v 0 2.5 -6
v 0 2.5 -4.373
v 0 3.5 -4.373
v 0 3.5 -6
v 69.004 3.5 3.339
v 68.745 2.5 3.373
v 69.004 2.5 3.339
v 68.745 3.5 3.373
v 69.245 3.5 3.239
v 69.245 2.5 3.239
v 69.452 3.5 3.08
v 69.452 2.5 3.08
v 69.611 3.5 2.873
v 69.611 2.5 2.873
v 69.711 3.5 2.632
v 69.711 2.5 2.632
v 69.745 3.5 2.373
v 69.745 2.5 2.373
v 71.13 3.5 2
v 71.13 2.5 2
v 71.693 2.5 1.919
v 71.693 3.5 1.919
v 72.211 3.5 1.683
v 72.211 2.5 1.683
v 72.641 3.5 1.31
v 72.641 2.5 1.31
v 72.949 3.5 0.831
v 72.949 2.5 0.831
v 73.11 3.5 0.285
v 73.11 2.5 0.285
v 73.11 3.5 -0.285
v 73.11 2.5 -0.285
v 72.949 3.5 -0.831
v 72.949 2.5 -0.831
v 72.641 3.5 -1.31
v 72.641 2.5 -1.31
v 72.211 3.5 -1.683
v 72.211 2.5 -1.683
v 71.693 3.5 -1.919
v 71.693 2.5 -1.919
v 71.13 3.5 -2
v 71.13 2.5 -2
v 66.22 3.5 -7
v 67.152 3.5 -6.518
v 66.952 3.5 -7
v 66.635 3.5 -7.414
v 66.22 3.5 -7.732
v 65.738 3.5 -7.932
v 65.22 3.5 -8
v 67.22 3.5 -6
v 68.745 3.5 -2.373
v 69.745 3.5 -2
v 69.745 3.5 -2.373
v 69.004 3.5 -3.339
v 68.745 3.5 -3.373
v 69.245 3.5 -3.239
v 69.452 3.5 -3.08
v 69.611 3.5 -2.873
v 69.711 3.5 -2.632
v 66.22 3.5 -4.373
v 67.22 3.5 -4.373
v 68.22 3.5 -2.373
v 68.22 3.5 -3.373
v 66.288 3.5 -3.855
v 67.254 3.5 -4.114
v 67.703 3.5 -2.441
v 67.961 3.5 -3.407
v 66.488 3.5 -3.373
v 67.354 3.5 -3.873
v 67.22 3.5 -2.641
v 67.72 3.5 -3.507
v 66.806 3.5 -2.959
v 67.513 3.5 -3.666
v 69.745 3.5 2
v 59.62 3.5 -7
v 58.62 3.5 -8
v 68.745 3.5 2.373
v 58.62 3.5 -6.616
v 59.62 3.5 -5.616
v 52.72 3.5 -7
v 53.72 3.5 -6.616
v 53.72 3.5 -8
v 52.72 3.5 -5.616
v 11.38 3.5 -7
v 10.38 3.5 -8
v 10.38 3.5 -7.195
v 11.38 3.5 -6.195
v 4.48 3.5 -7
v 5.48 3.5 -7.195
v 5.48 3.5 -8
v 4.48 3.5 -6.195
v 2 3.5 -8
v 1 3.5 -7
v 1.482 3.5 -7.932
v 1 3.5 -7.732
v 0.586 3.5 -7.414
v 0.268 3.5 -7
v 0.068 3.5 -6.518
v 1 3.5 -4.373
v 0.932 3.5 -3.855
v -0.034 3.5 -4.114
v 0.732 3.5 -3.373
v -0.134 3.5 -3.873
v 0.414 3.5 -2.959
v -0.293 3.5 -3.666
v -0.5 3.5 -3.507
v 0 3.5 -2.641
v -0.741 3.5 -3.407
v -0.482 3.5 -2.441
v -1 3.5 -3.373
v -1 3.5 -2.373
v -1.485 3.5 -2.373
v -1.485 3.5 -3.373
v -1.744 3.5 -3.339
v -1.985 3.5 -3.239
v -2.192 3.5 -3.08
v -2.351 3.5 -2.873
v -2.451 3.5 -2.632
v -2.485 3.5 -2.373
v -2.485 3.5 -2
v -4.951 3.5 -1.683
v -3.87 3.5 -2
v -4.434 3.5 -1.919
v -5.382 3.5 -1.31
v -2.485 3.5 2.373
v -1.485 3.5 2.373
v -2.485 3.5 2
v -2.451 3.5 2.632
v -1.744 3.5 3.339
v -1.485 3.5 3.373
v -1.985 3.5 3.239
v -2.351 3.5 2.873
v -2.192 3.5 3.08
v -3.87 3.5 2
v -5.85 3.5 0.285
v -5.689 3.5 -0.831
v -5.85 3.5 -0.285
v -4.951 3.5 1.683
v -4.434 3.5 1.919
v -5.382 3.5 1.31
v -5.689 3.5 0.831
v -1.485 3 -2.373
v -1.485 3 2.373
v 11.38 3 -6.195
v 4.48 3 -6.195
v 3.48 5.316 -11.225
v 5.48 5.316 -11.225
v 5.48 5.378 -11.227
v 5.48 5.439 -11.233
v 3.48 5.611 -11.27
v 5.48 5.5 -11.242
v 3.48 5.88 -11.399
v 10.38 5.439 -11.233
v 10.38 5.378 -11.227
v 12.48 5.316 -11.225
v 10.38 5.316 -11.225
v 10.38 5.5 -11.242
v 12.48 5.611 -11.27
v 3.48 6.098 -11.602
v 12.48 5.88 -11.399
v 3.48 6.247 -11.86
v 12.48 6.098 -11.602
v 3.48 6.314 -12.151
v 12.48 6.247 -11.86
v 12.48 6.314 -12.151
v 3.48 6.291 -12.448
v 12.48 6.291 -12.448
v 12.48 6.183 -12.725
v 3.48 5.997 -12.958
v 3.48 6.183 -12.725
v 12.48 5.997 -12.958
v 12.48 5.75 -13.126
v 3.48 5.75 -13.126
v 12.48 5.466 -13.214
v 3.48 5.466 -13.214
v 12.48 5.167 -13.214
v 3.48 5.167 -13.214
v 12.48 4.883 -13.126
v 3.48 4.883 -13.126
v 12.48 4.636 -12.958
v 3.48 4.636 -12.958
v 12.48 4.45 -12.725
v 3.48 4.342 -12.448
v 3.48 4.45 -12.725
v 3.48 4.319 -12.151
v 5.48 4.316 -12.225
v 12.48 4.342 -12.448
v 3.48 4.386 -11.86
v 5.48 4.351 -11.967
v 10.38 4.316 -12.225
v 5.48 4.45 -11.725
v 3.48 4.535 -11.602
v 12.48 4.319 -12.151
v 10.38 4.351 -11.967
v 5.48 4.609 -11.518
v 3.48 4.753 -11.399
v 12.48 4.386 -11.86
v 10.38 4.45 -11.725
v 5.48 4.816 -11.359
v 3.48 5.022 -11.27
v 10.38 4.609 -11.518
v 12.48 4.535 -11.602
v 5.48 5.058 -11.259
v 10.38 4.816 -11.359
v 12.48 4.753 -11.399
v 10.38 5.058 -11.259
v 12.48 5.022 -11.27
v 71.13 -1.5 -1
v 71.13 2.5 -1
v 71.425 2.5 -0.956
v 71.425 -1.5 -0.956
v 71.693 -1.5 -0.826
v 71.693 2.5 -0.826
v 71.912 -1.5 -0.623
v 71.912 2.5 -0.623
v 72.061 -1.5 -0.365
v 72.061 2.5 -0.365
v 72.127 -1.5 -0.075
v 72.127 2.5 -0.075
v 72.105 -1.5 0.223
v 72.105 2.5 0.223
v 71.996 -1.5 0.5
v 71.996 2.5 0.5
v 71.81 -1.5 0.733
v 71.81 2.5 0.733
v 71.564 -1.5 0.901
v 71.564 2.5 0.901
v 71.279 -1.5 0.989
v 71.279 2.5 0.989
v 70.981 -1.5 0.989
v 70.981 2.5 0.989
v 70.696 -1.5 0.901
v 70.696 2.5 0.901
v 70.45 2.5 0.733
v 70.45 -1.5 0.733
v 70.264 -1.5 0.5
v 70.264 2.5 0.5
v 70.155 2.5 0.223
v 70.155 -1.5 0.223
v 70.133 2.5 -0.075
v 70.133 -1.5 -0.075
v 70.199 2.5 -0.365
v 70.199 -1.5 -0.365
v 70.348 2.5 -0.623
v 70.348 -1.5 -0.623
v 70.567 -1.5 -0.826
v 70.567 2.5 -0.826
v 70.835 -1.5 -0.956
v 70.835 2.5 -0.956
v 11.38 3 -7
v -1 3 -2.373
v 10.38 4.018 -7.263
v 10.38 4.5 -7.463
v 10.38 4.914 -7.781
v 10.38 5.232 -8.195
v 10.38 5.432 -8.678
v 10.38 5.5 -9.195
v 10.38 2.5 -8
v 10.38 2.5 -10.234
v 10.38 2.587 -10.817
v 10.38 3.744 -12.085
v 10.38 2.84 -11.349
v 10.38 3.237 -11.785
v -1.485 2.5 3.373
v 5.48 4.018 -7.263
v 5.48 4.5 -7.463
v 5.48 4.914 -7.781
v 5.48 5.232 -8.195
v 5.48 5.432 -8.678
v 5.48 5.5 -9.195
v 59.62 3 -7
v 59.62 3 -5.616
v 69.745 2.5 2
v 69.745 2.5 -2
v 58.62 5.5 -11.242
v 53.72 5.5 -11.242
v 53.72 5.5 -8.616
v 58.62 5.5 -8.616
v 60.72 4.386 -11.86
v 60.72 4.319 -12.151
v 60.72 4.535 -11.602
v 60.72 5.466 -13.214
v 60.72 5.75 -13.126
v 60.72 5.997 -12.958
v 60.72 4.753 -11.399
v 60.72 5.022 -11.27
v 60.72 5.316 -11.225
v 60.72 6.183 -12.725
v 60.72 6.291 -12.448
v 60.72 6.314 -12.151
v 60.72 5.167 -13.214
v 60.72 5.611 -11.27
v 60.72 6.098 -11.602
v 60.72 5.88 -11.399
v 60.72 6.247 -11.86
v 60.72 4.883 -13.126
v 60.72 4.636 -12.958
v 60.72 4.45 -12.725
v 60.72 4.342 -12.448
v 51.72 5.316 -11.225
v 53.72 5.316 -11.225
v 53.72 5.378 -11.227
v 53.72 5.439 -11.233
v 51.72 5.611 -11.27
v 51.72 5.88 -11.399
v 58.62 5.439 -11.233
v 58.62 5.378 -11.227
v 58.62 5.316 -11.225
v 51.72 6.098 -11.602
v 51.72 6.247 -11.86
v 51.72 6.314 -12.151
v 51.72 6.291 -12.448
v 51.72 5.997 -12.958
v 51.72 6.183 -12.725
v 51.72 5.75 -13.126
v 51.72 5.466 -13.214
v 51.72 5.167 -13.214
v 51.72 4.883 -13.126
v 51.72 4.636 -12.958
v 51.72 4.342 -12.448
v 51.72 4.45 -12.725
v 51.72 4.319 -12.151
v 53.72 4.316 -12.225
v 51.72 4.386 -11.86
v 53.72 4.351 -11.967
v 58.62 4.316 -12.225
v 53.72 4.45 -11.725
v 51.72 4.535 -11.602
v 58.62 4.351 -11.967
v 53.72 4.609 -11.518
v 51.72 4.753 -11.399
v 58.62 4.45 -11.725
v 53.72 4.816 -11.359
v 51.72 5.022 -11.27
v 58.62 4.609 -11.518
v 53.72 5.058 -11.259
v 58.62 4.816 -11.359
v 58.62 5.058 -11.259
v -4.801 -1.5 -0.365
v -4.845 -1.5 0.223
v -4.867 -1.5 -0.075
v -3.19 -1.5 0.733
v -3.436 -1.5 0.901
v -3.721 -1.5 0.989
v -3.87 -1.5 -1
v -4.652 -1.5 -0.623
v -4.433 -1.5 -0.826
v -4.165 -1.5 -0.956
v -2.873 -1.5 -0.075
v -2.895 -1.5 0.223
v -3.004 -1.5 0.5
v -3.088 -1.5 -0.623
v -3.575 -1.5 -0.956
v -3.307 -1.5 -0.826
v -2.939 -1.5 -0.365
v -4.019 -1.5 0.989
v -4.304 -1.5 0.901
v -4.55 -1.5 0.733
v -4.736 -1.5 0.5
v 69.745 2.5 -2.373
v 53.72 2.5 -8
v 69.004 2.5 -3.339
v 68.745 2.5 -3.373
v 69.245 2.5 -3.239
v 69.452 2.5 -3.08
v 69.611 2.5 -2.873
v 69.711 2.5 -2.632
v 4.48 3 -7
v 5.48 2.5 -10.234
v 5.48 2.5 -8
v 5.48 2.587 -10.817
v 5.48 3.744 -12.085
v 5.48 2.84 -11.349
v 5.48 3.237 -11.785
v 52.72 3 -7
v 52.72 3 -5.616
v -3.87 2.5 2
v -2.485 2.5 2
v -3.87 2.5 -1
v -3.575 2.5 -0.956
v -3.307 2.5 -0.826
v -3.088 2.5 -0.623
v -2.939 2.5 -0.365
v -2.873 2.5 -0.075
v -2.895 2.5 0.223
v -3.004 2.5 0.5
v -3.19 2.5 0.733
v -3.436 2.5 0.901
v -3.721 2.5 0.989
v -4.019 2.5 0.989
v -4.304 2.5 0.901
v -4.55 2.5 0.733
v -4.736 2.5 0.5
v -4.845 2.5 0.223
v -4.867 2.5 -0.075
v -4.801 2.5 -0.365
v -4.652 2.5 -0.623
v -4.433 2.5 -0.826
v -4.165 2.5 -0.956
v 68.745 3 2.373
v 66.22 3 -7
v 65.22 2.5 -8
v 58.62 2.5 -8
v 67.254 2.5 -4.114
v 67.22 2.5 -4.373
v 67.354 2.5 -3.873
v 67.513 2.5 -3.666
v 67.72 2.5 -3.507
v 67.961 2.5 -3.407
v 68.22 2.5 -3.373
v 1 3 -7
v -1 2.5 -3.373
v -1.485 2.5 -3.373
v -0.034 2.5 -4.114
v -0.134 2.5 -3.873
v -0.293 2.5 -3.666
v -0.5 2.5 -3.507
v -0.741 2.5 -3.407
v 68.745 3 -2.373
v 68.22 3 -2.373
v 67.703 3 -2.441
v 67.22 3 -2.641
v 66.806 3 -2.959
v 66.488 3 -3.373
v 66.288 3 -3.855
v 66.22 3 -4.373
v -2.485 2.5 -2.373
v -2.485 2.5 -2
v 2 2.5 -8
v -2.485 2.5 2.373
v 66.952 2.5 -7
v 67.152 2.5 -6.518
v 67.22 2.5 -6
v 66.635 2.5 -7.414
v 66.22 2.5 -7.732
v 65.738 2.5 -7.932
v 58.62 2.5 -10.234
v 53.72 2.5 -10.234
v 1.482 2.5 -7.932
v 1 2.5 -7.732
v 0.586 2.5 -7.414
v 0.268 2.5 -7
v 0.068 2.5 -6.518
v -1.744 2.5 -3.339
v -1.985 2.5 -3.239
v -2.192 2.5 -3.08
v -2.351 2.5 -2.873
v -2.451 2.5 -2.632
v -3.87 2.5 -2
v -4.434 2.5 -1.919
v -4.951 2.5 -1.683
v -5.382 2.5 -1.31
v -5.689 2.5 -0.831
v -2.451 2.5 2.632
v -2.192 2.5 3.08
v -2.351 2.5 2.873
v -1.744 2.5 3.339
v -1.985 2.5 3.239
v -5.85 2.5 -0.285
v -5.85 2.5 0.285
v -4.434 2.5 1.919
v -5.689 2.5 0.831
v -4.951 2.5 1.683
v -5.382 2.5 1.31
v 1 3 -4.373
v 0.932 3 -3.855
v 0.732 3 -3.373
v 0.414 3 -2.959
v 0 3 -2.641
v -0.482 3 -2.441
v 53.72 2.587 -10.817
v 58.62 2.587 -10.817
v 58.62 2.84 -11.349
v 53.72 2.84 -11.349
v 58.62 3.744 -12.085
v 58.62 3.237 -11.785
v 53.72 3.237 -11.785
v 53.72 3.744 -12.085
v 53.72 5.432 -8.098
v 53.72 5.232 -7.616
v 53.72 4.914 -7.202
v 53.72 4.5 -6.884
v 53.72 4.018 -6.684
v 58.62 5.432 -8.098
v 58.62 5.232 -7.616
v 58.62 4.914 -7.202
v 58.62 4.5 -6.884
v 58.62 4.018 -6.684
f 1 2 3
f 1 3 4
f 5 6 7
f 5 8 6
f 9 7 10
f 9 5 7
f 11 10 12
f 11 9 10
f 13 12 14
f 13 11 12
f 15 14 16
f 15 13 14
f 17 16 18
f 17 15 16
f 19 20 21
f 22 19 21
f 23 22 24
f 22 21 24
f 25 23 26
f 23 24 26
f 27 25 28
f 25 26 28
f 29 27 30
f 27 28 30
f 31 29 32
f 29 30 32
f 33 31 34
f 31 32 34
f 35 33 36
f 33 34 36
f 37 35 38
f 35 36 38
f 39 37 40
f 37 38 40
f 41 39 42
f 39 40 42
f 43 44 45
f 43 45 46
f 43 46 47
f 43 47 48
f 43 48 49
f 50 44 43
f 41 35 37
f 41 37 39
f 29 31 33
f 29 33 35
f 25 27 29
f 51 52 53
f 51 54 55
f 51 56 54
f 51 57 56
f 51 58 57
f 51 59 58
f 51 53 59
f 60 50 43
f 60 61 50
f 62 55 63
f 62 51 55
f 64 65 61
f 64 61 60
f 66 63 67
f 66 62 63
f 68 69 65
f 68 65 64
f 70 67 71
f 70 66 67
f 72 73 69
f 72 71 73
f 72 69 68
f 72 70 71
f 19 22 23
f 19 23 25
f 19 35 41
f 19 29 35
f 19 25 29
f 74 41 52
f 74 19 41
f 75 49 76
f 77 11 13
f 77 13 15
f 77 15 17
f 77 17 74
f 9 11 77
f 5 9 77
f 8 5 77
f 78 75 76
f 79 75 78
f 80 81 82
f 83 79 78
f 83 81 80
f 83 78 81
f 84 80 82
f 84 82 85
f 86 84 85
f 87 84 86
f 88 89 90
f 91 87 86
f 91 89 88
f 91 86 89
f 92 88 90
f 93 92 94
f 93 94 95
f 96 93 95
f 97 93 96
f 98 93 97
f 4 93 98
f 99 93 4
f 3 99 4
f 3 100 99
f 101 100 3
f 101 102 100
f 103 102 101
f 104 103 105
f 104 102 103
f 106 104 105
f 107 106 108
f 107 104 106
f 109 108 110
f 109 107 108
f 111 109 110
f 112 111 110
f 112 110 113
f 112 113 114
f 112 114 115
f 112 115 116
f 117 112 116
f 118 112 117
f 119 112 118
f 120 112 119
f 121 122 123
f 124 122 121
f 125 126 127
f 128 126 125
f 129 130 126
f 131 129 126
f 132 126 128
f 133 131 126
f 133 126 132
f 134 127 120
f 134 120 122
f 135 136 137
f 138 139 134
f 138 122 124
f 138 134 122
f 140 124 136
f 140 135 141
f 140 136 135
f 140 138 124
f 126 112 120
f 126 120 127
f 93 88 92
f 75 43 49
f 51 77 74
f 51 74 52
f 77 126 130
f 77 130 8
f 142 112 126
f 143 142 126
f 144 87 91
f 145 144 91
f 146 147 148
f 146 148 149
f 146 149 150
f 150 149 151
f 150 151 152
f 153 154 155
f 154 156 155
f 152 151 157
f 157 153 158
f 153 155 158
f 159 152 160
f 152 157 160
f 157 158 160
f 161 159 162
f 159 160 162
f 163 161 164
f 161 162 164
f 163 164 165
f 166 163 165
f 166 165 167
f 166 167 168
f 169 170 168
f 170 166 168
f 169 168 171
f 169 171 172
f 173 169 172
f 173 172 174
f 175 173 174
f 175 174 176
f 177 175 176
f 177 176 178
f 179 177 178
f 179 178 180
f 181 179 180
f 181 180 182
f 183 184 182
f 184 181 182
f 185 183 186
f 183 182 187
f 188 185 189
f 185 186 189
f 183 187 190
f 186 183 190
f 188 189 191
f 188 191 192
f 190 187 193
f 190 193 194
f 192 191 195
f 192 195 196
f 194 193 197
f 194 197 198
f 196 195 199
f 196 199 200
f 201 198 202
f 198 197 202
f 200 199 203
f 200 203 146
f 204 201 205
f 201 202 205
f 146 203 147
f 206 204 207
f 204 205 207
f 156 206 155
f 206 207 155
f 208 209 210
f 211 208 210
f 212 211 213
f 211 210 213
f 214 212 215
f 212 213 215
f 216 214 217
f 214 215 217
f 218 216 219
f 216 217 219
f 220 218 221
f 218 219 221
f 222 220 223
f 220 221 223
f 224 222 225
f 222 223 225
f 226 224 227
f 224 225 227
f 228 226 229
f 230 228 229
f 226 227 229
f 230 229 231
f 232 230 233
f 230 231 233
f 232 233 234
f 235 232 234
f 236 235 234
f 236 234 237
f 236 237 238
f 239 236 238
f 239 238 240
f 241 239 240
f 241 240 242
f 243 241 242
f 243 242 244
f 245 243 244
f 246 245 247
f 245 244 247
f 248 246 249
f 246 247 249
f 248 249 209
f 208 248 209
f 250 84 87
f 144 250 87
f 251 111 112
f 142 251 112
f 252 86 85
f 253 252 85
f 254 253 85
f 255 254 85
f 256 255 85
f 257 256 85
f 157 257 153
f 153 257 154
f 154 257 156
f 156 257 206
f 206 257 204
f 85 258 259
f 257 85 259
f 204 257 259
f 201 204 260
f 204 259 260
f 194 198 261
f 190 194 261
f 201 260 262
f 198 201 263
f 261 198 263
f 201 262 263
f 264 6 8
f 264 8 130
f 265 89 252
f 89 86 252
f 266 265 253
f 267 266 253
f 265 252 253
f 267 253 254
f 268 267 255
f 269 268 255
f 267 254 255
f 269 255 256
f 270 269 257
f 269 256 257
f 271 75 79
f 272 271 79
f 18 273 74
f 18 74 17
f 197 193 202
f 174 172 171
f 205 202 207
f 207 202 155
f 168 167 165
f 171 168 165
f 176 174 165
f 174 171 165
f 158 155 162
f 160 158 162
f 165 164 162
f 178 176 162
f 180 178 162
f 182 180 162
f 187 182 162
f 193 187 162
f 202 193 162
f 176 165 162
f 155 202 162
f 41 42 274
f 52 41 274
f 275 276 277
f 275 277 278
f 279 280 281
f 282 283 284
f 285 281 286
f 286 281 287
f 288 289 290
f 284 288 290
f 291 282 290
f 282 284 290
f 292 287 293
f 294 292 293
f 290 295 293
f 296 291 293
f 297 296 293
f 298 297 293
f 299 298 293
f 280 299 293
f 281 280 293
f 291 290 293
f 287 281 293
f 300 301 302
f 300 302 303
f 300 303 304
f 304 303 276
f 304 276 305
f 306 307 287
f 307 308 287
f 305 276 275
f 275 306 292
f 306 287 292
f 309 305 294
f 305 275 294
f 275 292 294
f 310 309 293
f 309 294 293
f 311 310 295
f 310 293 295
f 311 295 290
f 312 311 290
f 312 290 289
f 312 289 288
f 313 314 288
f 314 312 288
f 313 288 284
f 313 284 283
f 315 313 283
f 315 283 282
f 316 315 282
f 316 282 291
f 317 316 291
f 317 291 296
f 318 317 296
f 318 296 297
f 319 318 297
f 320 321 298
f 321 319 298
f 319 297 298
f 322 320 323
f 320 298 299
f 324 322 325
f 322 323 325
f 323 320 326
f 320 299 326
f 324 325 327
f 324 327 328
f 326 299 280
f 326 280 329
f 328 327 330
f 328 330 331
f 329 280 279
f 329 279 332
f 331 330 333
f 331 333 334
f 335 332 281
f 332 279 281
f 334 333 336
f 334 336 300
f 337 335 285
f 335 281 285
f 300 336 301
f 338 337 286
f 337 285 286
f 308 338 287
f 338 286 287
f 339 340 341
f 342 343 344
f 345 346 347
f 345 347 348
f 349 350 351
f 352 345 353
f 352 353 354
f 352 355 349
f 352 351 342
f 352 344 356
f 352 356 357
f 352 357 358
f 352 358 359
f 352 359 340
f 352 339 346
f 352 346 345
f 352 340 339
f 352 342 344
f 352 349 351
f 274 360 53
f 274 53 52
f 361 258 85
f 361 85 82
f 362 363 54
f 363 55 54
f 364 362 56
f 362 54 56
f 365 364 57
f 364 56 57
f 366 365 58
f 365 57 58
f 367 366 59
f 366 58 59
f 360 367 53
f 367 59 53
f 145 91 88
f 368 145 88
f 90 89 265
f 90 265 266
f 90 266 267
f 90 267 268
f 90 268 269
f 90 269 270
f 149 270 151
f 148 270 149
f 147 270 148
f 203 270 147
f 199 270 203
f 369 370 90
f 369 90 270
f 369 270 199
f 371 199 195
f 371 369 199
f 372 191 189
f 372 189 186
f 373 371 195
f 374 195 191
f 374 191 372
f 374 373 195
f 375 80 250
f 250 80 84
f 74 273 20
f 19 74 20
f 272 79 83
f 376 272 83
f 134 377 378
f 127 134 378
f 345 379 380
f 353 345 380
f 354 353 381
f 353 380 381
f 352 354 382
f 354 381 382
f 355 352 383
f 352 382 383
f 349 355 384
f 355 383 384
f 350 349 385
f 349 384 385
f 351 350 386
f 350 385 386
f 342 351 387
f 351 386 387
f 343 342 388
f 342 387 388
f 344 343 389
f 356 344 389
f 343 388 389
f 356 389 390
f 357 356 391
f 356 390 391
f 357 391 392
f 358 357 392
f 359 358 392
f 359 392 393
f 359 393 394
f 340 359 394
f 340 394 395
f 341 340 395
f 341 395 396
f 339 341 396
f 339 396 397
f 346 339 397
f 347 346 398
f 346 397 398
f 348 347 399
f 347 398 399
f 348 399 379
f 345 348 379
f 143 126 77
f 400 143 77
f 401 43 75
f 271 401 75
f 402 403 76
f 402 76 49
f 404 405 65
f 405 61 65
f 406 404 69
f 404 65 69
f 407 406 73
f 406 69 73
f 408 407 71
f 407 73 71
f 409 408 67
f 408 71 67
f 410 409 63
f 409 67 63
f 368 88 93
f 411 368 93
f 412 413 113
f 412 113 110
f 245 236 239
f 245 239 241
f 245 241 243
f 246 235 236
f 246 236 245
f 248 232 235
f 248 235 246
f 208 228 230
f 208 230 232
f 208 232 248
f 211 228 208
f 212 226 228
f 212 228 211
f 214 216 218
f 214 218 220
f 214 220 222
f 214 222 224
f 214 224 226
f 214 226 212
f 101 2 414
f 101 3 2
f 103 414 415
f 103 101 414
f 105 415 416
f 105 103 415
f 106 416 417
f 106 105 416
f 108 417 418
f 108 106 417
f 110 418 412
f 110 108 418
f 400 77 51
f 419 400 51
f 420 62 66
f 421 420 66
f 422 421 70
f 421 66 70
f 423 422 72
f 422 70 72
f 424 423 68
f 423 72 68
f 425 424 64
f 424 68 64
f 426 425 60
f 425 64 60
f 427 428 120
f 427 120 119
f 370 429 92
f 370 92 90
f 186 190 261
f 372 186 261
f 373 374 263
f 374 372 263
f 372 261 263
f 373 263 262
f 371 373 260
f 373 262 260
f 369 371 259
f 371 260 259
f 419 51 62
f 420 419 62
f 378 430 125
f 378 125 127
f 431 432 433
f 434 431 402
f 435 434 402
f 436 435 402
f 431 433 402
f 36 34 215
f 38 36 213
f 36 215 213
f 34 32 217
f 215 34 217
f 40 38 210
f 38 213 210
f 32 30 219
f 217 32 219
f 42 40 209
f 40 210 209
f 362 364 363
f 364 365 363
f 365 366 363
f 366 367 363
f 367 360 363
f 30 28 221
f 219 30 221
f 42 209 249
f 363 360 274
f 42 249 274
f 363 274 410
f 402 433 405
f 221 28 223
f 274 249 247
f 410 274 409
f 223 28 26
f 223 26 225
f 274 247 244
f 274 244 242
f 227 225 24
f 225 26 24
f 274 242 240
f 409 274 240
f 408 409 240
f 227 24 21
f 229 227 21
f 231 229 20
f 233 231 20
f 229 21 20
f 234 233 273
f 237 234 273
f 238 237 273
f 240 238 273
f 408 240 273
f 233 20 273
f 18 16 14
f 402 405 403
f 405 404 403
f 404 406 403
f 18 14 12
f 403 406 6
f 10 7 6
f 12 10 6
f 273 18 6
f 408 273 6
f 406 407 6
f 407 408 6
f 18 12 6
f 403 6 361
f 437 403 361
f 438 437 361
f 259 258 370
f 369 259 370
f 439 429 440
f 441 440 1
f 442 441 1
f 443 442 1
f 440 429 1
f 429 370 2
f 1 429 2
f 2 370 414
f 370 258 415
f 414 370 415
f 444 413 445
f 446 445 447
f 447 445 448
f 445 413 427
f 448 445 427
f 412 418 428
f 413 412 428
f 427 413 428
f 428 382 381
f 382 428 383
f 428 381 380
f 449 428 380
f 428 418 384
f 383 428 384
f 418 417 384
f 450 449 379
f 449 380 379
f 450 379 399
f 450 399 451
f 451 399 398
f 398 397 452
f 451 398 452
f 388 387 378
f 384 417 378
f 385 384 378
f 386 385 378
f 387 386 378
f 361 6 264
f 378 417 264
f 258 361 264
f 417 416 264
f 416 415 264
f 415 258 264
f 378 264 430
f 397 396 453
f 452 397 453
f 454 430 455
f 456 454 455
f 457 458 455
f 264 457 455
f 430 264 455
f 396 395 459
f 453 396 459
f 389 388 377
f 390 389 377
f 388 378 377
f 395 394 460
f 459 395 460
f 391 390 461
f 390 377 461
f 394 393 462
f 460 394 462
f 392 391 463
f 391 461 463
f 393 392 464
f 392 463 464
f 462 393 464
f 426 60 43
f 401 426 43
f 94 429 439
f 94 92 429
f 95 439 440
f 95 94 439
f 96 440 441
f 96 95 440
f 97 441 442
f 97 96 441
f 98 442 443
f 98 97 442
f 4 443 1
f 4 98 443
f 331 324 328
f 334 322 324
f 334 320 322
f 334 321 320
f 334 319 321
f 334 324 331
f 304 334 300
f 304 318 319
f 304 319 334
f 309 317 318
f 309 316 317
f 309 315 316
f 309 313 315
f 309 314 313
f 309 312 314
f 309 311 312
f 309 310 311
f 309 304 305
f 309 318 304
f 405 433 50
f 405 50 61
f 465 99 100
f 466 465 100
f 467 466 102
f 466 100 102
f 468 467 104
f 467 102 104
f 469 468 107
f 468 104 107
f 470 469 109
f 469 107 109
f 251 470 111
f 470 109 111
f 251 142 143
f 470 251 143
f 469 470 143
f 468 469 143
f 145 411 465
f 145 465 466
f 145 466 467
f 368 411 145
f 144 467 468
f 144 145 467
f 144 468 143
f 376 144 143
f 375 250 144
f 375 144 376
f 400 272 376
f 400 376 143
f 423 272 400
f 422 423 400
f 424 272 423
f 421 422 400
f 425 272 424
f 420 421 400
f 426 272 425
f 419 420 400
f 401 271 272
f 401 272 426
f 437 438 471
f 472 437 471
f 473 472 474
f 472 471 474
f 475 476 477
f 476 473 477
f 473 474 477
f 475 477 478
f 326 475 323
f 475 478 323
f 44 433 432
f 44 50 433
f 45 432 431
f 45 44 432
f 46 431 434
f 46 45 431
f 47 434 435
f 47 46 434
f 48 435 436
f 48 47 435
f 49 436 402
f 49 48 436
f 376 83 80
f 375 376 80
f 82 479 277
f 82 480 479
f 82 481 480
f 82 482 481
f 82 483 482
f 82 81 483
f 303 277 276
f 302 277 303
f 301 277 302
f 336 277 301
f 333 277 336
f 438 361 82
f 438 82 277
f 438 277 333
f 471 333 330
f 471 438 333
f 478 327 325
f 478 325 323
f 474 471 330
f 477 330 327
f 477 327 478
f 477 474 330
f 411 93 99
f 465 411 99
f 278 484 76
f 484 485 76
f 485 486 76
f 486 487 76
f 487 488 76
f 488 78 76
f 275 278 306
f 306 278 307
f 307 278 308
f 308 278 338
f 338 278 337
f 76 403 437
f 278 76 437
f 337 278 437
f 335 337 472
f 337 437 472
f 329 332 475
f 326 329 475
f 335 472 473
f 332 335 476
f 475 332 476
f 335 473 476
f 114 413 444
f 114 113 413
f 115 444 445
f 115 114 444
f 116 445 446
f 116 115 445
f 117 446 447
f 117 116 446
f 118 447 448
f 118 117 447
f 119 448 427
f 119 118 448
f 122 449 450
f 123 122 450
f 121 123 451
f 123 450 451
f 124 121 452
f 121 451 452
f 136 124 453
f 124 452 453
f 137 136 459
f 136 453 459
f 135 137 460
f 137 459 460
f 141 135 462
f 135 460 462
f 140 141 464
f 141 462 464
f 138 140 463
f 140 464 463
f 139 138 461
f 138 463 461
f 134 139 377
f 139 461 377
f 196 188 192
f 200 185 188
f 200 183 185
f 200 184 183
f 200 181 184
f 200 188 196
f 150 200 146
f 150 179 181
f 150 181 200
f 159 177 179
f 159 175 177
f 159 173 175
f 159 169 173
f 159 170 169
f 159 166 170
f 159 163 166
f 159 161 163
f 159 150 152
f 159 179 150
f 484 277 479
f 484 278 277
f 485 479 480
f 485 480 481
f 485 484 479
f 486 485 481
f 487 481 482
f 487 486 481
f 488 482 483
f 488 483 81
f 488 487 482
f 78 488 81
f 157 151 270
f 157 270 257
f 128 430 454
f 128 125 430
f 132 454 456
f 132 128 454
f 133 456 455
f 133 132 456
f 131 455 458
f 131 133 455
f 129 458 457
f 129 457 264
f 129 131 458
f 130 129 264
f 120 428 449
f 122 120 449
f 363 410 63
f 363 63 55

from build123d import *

# Parameters (mm, degrees)
SKETCH1_R                = 2
BOSS_EXTRUDE1_DEPTH      = 2.5
BOSS_EXTRUDE1_2_DEPTH    = 2.5
BOSS_EXTRUDE3_DEPTH      = 1
FILLET1_R                = 1
BOSS_EXTRUDE4_DEPTH      = 2
BOSS_EXTRUDE4_DEPTH_BACK = 1
SKETCH3_W                = 4.9
SKETCH3_H                = 5.030022666
SKETCH3_H_2              = 5.609354891
BOSS_EXTRUDE5_DEPTH      = 2
BOSS_EXTRUDE5_DEPTH_BACK = 7
SKETCH4_R                = 1
BOSS_EXTRUDE6_DEPTH      = 2
BOSS_EXTRUDE6_DEPTH_BACK = 7
SKETCH5_R                = 1
FILLET2_R                = 2
FILLET3_R                = 2
CUT_EXTRUDE1_DEPTH       = 0.5
FILLET4_R                = 2
FILLET6_R                = 2
SKETCH7_W                = 77.047719234
SKETCH7_H                = 13.468868212
CUT_EXTRUDE2_DEPTH       = 10
SKETCH8_R                = 1
BOSS_EXTRUDE7_DEPTH      = 4
BOSS_EXTRUDE7_2_DEPTH    = 4
BOSS_EXTRUDE8_DEPTH      = 1
SKETCH10_W               = 70.230539596
SKETCH10_H               = 4.186533739
CUT_EXTRUDE4_DEPTH       = 1


# Some blends are built 0.0001 mm under size
with BuildPart() as part:
    # Sketch1 → Boss-Extrude1 (new body)
    with BuildSketch(Plane(origin=(0, 0, 0), x_dir=(1, 0, 0), z_dir=(0, 1, 0))):
        with Locations(Location((67.22, 0, 0), (0, 0, 270))):
            Circle(SKETCH1_R)
    extrude(amount=BOSS_EXTRUDE1_DEPTH)



with BuildPart() as body_2:
    # Sketch1 → Boss-Extrude1 2 (new body)
    with BuildSketch(Plane(origin=(0, 0, 0), x_dir=(1, 0, 0), z_dir=(0, 1, 0))):
        with Locations(Location((0, 0, 0), (0, 0, 270))):
            Circle(SKETCH1_R)
    extrude(amount=BOSS_EXTRUDE1_2_DEPTH)


with BuildPart() as part_1:
    add(part.part)

    add(body_2.part)  # Boss-Extrude3 merges body 2
    # Sketch2 → Boss-Extrude3 (add)
    with BuildSketch(Plane(origin=(0, 2.5, 0), x_dir=(1, 0, 0), z_dir=(0, 1, 0))):
        Polygon((0, 3.373067478), (0, 8), (67.22031246, 8), (67.22031246, 3.373067478), (69.745167769, 3.373067478), (69.745167769, -3.373067478), (-2.485371827, -3.373067478), (-2.485371827, 3.373067478), align=None)
    extrude(amount=BOSS_EXTRUDE3_DEPTH)

    # Fillet1
    fillet1_edges = [part_1.edges().sort_by_distance(p)[0] for p in [
        (67.22031246, 3, -3.373067478),
        (0, 3, -3.373067478),
        (-2.485371827, 3, -3.373067478),
        (-2.485371827, 3, 3.373067478),
        (69.745167769, 3, 3.373067478),
        (69.745167769, 3, -3.373067478),
    ]]
    fillet(fillet1_edges, radius=FILLET1_R)

    # Sketch3 → Boss-Extrude4 (add, two sides: drawn at the far end of the back side and taken through both)
    with BuildSketch(Plane(origin=(0, 3.5, 0), x_dir=(1, 0, 0), z_dir=(0, 1, 0)).offset(-BOSS_EXTRUDE4_DEPTH_BACK)):
        with Locations((7.93, 9.710321272)):
            Rectangle(SKETCH3_W, SKETCH3_H)
        with Locations((56.17, 9.42065516)):
            Rectangle(SKETCH3_W, SKETCH3_H_2)
    extrude(amount=BOSS_EXTRUDE4_DEPTH + BOSS_EXTRUDE4_DEPTH_BACK)

    # Sketch4 → Boss-Extrude5 (add, two sides: drawn at the far end of the back side and taken through both)
    with BuildSketch(Plane.ZY.offset(-5.48).offset(-BOSS_EXTRUDE5_DEPTH_BACK)):
        with Locations((-12.225332605, 5.316497078)):
            Circle(SKETCH4_R)
    extrude(amount=BOSS_EXTRUDE5_DEPTH + BOSS_EXTRUDE5_DEPTH_BACK)

    # Sketch5 → Boss-Extrude6 (add, two sides: drawn at the far end of the back side and taken through both)
    with BuildSketch(Plane.ZY.offset(-53.72).offset(-BOSS_EXTRUDE6_DEPTH_BACK)):
        with Locations((-12.225332605, 5.316497078)):
            Circle(SKETCH5_R)
    extrude(amount=BOSS_EXTRUDE6_DEPTH + BOSS_EXTRUDE6_DEPTH_BACK)

    # Fillet2
    fillet2_edges = [part_1.edges().sort_by_distance(p)[0] for p in [
        (7.93, 5.5, -7.195309939),
        (56.17, 5.5, -6.615977714),
    ]]
    fillet(fillet2_edges, radius=FILLET2_R - 0.0001)  # a hair under: the kernel refuses the full size

    # Fillet3
    # the kernel refuses this fillet: 2 mm, written as the material it takes off along each edge
    with BuildSketch(Plane(origin=(48.741090307, 2.5, -12.225332605), x_dir=(0, 0, 1), z_dir=(1, 0, 0))) as fillet3_piece_1:
        with BuildLine():
            CenterArc((1.991563877, -2), FILLET3_R, 90, 84.735624625)
            Line((0, -1.816497078), (-0.039831278, -1.81282702))
            ThreePointArc((-0.039831278, -1.81282702), (-0.04, -0.908248539), (-0.04, 0))
            Line((-0.04, 0), (0, 0.04))
            Line((0, 0.04), (1.991563877, 0.04))
            Line((1.991563877, 0.04), (1.991563877, 0))
        make_face()
    extrude(amount=14.857819387, mode=Mode.SUBTRACT)

    # Sketch6 → Cut-Extrude1 (cut)
    with BuildSketch(Plane(origin=(0, 3.5, 0), x_dir=(1, 0, 0), z_dir=(0, 1, 0))):
        with BuildLine():
            Line((59.62, 5.615977714), (52.72, 5.615977714))
            Line((52.72, 5.615977714), (52.72, 7))
            Line((52.72, 7), (11.38, 7))
            Line((11.38, 7), (11.38, 6.195309939))
            Line((11.38, 6.195309939), (4.48, 6.195309939))
            Line((4.48, 6.195309939), (4.48, 7))
            Line((4.48, 7), (1, 7))
            Line((1, 7), (1, 4.373067478))
            ThreePointArc((1, 4.373067478), (0.414213562, 2.958853916), (-1, 2.373067478))
            Line((-1, 2.373067478), (-1.485371827, 2.373067478))
            Line((-1.485371827, 2.373067478), (-1.485371827, -2.373067478))
            Line((-1.485371827, -2.373067478), (68.745167769, -2.373067478))
            Line((68.745167769, -2.373067478), (68.745167769, 2.373067478))
            Line((68.745167769, 2.373067478), (68.22031246, 2.373067478))
            ThreePointArc((68.22031246, 2.373067478), (66.806098898, 2.958853916), (66.22031246, 4.373067478))
            Line((66.22031246, 4.373067478), (66.22031246, 7))
            Line((66.22031246, 7), (59.62, 7))
            Line((59.62, 7), (59.62, 5.615977714))
        make_face()
    extrude(amount=-CUT_EXTRUDE1_DEPTH, mode=Mode.SUBTRACT)

    # Fillet4
    # the kernel refuses this fillet: 2 mm, written as the material it takes off along each edge
    with BuildSketch(Plane(origin=(15.358909693, 2.5, -12.225332605), x_dir=(0, 0, 1), z_dir=(-1, 0, 0))) as fillet4_piece_1:
        with BuildLine():
            CenterArc((1.991563877, 2), FILLET4_R, 185.264375375, 84.735624625)
            Line((0, 1.816497078), (-0.039831278, 1.81282702))
            ThreePointArc((-0.039831278, 1.81282702), (-0.04, 0.908248539), (-0.04, 0))
            Line((-0.04, 0), (0, -0.04))
            Line((0, -0.04), (1.991563877, -0.04))
            Line((1.991563877, -0.04), (1.991563877, 0))
        make_face()
    extrude(amount=14.857819387, mode=Mode.SUBTRACT)

    # Fillet6
    fillet6_edges = [part_1.edges().sort_by_distance(p)[0] for p in [
        (67.22031246, 3, -8),
        (0, 3, -8),
    ]]
    fillet(fillet6_edges, radius=FILLET6_R)

    # Sketch7 → Cut-Extrude2 (cut)
    with BuildSketch(Plane.XZ.offset(-2.5)):
        with Locations((32.181632572, 2.423814337)):
            Rectangle(SKETCH7_W, SKETCH7_H)
    extrude(amount=CUT_EXTRUDE2_DEPTH, mode=Mode.SUBTRACT)



with BuildPart() as body_2_2:
    # Sketch8 → Boss-Extrude7 (new body)
    with BuildSketch(Plane(origin=(0, 2.5, 0), x_dir=(-1, 0, 0), z_dir=(0, -1, 0))):
        with Locations(Location((3.870102029, 0, 0), (0, 0, 90))):
            Circle(SKETCH8_R)
    extrude(amount=BOSS_EXTRUDE7_DEPTH)


with BuildPart() as body_3:
    # Sketch8 → Boss-Extrude7 2 (new body)
    with BuildSketch(Plane(origin=(0, 2.5, 0), x_dir=(-1, 0, 0), z_dir=(0, -1, 0))):
        with Locations(Location((-71.129897971, 0, 0), (0, 0, 90))):
            Circle(SKETCH8_R)
    extrude(amount=BOSS_EXTRUDE7_2_DEPTH)


with BuildPart() as part_2:
    add(part_1.part)

    add(body_2_2.part)  # Boss-Extrude8 merges body 2 2

    add(body_3.part)  # Boss-Extrude8 merges body 3
    # Sketch9 → Boss-Extrude8 (add)
    with BuildSketch(Plane.XZ.offset(-2.5)):
        with BuildLine():
            Line((-3.870102029, 2), (71.129897971, 2))
            ThreePointArc((71.129897971, 2), (73.129897971, 0), (71.129897971, -2))
            Line((71.129897971, -2), (-3.870102029, -2))
            ThreePointArc((-3.870102029, -2), (-5.870102029, 0), (-3.870102029, 2))
        make_face()
    extrude(amount=-BOSS_EXTRUDE8_DEPTH)

    # Sketch10 → Cut-Extrude4 (cut)
    with BuildSketch(Plane(origin=(0, 3, 0), x_dir=(1, 0, 0), z_dir=(0, 1, 0))):
        with Locations((33.629897971, -0.09326687)):
            Rectangle(SKETCH10_W, SKETCH10_H)
    extrude(amount=CUT_EXTRUDE4_DEPTH, mode=Mode.SUBTRACT)


solid = part_2.part
